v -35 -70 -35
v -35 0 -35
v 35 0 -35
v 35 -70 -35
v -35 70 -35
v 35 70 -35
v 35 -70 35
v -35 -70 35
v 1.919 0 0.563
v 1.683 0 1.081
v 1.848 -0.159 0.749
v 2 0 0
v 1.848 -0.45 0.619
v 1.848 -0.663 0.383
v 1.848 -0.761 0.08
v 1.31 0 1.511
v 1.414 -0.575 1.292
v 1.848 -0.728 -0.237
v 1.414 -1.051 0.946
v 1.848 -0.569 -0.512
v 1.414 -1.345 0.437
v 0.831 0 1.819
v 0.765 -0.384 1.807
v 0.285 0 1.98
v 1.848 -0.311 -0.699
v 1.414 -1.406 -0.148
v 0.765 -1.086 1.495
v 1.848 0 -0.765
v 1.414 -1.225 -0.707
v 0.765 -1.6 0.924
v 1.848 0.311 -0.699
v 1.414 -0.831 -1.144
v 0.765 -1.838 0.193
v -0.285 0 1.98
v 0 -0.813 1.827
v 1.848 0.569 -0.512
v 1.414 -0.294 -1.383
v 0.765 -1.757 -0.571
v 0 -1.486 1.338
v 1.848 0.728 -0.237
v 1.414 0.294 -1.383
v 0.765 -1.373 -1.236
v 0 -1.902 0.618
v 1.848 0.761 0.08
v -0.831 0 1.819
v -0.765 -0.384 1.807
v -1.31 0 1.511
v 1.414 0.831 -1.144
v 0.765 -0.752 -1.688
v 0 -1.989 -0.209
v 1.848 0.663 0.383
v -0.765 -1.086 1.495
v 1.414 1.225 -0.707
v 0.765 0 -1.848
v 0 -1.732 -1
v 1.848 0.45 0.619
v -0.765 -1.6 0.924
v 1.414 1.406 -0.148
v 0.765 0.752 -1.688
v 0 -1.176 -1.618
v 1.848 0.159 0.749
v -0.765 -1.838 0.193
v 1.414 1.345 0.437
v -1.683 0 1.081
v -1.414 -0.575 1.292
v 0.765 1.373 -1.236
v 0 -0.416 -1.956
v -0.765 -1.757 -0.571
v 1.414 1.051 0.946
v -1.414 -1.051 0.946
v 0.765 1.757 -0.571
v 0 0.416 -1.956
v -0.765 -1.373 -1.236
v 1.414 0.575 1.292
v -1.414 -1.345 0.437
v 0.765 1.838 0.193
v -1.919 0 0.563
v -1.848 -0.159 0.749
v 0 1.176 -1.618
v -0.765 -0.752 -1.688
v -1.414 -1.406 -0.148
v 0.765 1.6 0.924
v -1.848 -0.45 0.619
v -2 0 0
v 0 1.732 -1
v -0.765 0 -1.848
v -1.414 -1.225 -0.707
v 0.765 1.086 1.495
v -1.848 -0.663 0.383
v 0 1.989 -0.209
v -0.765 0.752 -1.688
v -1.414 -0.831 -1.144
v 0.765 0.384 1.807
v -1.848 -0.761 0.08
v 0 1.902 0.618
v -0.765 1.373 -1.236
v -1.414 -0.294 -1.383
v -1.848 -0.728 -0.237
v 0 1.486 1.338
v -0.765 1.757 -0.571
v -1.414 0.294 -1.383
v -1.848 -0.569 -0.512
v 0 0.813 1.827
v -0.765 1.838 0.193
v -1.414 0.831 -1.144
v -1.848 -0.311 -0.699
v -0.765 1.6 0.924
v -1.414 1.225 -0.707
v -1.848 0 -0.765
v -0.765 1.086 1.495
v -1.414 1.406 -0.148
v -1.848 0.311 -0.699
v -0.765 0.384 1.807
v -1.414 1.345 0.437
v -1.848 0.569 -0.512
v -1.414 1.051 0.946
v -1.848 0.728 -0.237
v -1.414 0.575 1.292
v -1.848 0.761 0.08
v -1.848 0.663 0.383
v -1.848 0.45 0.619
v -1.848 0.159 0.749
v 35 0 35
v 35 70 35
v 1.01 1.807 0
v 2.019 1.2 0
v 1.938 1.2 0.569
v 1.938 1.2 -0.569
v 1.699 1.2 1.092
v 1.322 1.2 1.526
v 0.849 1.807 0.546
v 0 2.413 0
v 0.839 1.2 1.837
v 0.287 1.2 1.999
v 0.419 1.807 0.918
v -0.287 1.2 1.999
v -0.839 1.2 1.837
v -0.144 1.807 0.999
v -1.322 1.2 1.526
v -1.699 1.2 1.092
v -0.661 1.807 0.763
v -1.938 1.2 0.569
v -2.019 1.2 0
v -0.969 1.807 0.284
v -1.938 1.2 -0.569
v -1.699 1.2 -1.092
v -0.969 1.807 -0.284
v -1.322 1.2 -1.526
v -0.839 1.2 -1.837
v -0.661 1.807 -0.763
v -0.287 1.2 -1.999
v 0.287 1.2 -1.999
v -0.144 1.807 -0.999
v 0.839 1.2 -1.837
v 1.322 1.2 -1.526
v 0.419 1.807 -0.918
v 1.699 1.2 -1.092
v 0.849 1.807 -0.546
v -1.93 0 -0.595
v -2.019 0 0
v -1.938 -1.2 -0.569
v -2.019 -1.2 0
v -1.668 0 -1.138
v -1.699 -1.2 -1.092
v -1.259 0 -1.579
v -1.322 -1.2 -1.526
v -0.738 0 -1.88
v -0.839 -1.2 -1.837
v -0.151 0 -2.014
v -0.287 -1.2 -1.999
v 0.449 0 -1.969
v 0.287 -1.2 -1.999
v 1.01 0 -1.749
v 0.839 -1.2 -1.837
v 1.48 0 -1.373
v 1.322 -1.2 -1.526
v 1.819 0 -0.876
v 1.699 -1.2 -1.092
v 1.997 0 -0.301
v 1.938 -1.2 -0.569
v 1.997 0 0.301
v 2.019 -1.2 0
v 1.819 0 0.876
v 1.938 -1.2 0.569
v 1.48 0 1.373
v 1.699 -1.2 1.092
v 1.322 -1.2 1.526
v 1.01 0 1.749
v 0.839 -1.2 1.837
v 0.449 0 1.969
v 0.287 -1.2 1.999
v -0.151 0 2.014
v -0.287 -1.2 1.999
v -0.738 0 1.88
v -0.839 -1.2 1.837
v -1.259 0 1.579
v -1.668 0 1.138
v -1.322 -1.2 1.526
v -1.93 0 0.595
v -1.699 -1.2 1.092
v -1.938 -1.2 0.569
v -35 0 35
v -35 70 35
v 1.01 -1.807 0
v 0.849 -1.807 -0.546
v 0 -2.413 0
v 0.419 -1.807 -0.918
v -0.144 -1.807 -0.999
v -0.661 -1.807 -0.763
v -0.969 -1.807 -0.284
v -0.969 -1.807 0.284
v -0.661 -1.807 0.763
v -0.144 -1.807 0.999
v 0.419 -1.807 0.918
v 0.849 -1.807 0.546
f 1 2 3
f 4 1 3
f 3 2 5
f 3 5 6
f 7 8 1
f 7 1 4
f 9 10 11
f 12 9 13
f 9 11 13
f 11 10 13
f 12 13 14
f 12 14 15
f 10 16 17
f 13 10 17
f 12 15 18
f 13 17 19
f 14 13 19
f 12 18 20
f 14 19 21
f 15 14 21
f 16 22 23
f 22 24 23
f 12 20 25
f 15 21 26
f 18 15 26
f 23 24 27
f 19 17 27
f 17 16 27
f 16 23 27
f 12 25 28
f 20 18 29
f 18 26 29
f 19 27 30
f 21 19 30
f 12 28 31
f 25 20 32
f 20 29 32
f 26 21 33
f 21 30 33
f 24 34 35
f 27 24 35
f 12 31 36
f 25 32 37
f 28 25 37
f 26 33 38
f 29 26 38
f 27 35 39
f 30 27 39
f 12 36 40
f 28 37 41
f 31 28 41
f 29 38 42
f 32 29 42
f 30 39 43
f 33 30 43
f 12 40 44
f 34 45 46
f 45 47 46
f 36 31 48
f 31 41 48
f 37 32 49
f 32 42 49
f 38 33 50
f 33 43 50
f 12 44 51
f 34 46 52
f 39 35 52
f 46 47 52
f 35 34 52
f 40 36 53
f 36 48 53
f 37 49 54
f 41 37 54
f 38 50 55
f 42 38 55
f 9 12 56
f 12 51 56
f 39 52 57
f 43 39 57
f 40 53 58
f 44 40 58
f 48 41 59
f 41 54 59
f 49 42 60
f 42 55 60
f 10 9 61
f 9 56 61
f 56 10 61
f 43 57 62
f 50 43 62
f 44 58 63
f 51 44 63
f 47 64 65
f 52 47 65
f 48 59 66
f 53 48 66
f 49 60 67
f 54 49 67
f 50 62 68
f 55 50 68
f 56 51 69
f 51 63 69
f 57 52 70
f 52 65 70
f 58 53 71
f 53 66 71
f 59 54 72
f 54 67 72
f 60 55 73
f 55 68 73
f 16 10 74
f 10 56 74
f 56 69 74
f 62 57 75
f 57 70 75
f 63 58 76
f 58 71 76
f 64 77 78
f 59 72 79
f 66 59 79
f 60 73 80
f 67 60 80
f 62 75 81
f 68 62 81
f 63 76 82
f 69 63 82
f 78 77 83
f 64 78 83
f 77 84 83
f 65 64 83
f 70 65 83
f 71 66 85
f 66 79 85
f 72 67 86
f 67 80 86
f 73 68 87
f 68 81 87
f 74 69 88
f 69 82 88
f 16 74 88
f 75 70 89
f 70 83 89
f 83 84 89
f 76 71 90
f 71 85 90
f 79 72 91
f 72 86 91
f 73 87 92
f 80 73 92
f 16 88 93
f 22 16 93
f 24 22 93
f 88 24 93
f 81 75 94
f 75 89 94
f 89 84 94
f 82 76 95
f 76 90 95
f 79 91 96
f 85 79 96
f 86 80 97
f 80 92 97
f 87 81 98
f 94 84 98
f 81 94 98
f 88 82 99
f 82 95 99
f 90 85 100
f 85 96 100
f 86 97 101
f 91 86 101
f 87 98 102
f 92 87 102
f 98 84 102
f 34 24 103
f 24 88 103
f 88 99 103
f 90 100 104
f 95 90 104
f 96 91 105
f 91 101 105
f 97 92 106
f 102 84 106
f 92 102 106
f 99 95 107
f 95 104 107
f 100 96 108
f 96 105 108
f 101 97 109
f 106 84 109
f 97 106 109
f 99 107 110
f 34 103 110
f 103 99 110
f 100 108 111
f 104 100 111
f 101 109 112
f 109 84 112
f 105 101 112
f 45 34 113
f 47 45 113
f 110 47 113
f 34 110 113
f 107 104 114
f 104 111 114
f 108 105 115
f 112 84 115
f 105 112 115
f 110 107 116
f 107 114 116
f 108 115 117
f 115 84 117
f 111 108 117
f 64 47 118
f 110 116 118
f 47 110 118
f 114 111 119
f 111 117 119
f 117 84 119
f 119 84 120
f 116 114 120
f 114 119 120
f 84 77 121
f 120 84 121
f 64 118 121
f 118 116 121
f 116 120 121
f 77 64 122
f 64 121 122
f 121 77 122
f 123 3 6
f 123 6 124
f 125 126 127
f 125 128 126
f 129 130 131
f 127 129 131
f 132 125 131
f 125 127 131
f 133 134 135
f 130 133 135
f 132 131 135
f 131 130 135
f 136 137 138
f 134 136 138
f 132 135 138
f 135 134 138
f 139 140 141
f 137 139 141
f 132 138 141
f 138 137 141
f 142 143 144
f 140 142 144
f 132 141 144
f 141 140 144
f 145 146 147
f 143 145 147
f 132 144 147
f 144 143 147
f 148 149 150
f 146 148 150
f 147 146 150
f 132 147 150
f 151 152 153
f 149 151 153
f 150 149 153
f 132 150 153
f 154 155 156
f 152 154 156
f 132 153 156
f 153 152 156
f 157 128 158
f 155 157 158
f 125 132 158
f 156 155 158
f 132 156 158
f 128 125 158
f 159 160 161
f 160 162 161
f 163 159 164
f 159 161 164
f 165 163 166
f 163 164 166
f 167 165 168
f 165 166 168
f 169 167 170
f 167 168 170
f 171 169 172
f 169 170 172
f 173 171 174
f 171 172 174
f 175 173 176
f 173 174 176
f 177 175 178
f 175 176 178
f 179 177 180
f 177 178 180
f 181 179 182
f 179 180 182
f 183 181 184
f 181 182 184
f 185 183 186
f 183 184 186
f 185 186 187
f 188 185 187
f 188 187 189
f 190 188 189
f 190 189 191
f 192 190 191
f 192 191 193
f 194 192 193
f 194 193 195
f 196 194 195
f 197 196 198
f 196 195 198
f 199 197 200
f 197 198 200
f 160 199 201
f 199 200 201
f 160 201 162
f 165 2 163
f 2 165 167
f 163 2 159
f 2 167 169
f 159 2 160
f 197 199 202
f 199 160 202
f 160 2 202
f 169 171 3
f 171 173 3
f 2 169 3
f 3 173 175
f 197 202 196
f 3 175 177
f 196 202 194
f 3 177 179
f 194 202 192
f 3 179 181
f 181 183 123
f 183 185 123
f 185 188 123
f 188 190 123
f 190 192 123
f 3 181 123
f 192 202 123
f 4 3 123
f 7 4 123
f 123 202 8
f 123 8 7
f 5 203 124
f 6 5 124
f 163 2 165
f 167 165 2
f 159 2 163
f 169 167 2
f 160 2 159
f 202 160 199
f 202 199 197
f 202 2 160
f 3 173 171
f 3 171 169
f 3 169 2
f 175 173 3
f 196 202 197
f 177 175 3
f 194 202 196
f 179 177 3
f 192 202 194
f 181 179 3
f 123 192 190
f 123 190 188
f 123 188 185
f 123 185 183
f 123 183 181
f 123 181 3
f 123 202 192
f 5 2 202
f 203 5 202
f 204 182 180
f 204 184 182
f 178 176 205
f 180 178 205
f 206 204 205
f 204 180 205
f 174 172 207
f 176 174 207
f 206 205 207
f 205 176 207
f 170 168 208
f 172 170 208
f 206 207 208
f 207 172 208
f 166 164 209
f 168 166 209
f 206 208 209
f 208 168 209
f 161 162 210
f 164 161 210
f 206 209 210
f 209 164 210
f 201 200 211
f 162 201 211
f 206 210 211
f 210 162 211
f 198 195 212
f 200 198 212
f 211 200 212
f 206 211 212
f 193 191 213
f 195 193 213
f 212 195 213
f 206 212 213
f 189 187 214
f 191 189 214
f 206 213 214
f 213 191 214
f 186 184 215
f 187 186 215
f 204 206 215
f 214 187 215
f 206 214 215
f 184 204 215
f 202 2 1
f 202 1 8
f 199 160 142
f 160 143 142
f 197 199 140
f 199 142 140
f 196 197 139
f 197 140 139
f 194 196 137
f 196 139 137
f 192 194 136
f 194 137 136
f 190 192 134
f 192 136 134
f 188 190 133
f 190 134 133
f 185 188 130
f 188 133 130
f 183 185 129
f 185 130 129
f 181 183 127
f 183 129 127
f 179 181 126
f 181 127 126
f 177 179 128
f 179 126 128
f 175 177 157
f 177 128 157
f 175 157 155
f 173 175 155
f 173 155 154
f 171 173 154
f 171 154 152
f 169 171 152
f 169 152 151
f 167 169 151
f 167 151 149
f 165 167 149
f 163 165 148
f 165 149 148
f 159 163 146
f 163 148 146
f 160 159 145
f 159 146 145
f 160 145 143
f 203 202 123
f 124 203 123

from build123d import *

# Parameters (mm, degrees)
F2_W     = 70
F2_H     = 70
F2_R     = 2
F3_DEPTH = 70
F4_D     = 4.0386
F4_DEPTH = 1.2
F4_TIP   = 1.213317848
F5_W     = 70
F5_H     = 70
F5_R     = 2
F6_DEPTH = 70
F7_D     = 4.0386
F7_DEPTH = 1.2
F7_TIP   = 1.213317848


with BuildPart() as f1:
    # F0 (on Front) → F1 (revolve)
    with BuildSketch(Plane.XZ):
        with BuildLine():
            Line((-2, 0), (2, 0))
            ThreePointArc((2, 0), (0, 2), (-2, 0))
        make_face()
    revolve(axis=Axis((0, 0, 0), (1, 0, 0)))


with BuildPart() as f3:
    # F2 (on Front) → F3 (new body)
    with BuildSketch(Plane.XZ):
        Rectangle(F2_W, F2_H)
        Circle(F2_R, mode=Mode.SUBTRACT)
        Circle(F2_R)
    extrude(amount=F3_DEPTH)

    # F4
    with Locations(Plane(origin=(0, 0, 0), x_dir=(1, 0, 0), z_dir=(0, 1, 0))):
        with Locations((0, 0)):
            Hole(F4_D / 2, depth=F4_DEPTH)
            with Locations((0, 0, -(F4_DEPTH + F4_TIP / 2))):  # 118° drill point
                Cone(0, F4_D / 2, F4_TIP, mode=Mode.SUBTRACT)


with BuildPart() as f6:
    # F5 (on face) → F6 (new body)
    with BuildSketch(Plane.XZ):
        Rectangle(F5_W, F5_H)
        Circle(F5_R, mode=Mode.SUBTRACT)
        Circle(F5_R)
    extrude(amount=-F6_DEPTH)

    # F7
    with Locations(Plane.XZ):
        with Locations((0, 0)):
            Hole(F7_D / 2, depth=F7_DEPTH)
            with Locations((0, 0, -(F7_DEPTH + F7_TIP / 2))):  # 118° drill point
                Cone(0, F7_D / 2, F7_TIP, mode=Mode.SUBTRACT)


solid = Compound([f1.part, f3.part, f6.part])
